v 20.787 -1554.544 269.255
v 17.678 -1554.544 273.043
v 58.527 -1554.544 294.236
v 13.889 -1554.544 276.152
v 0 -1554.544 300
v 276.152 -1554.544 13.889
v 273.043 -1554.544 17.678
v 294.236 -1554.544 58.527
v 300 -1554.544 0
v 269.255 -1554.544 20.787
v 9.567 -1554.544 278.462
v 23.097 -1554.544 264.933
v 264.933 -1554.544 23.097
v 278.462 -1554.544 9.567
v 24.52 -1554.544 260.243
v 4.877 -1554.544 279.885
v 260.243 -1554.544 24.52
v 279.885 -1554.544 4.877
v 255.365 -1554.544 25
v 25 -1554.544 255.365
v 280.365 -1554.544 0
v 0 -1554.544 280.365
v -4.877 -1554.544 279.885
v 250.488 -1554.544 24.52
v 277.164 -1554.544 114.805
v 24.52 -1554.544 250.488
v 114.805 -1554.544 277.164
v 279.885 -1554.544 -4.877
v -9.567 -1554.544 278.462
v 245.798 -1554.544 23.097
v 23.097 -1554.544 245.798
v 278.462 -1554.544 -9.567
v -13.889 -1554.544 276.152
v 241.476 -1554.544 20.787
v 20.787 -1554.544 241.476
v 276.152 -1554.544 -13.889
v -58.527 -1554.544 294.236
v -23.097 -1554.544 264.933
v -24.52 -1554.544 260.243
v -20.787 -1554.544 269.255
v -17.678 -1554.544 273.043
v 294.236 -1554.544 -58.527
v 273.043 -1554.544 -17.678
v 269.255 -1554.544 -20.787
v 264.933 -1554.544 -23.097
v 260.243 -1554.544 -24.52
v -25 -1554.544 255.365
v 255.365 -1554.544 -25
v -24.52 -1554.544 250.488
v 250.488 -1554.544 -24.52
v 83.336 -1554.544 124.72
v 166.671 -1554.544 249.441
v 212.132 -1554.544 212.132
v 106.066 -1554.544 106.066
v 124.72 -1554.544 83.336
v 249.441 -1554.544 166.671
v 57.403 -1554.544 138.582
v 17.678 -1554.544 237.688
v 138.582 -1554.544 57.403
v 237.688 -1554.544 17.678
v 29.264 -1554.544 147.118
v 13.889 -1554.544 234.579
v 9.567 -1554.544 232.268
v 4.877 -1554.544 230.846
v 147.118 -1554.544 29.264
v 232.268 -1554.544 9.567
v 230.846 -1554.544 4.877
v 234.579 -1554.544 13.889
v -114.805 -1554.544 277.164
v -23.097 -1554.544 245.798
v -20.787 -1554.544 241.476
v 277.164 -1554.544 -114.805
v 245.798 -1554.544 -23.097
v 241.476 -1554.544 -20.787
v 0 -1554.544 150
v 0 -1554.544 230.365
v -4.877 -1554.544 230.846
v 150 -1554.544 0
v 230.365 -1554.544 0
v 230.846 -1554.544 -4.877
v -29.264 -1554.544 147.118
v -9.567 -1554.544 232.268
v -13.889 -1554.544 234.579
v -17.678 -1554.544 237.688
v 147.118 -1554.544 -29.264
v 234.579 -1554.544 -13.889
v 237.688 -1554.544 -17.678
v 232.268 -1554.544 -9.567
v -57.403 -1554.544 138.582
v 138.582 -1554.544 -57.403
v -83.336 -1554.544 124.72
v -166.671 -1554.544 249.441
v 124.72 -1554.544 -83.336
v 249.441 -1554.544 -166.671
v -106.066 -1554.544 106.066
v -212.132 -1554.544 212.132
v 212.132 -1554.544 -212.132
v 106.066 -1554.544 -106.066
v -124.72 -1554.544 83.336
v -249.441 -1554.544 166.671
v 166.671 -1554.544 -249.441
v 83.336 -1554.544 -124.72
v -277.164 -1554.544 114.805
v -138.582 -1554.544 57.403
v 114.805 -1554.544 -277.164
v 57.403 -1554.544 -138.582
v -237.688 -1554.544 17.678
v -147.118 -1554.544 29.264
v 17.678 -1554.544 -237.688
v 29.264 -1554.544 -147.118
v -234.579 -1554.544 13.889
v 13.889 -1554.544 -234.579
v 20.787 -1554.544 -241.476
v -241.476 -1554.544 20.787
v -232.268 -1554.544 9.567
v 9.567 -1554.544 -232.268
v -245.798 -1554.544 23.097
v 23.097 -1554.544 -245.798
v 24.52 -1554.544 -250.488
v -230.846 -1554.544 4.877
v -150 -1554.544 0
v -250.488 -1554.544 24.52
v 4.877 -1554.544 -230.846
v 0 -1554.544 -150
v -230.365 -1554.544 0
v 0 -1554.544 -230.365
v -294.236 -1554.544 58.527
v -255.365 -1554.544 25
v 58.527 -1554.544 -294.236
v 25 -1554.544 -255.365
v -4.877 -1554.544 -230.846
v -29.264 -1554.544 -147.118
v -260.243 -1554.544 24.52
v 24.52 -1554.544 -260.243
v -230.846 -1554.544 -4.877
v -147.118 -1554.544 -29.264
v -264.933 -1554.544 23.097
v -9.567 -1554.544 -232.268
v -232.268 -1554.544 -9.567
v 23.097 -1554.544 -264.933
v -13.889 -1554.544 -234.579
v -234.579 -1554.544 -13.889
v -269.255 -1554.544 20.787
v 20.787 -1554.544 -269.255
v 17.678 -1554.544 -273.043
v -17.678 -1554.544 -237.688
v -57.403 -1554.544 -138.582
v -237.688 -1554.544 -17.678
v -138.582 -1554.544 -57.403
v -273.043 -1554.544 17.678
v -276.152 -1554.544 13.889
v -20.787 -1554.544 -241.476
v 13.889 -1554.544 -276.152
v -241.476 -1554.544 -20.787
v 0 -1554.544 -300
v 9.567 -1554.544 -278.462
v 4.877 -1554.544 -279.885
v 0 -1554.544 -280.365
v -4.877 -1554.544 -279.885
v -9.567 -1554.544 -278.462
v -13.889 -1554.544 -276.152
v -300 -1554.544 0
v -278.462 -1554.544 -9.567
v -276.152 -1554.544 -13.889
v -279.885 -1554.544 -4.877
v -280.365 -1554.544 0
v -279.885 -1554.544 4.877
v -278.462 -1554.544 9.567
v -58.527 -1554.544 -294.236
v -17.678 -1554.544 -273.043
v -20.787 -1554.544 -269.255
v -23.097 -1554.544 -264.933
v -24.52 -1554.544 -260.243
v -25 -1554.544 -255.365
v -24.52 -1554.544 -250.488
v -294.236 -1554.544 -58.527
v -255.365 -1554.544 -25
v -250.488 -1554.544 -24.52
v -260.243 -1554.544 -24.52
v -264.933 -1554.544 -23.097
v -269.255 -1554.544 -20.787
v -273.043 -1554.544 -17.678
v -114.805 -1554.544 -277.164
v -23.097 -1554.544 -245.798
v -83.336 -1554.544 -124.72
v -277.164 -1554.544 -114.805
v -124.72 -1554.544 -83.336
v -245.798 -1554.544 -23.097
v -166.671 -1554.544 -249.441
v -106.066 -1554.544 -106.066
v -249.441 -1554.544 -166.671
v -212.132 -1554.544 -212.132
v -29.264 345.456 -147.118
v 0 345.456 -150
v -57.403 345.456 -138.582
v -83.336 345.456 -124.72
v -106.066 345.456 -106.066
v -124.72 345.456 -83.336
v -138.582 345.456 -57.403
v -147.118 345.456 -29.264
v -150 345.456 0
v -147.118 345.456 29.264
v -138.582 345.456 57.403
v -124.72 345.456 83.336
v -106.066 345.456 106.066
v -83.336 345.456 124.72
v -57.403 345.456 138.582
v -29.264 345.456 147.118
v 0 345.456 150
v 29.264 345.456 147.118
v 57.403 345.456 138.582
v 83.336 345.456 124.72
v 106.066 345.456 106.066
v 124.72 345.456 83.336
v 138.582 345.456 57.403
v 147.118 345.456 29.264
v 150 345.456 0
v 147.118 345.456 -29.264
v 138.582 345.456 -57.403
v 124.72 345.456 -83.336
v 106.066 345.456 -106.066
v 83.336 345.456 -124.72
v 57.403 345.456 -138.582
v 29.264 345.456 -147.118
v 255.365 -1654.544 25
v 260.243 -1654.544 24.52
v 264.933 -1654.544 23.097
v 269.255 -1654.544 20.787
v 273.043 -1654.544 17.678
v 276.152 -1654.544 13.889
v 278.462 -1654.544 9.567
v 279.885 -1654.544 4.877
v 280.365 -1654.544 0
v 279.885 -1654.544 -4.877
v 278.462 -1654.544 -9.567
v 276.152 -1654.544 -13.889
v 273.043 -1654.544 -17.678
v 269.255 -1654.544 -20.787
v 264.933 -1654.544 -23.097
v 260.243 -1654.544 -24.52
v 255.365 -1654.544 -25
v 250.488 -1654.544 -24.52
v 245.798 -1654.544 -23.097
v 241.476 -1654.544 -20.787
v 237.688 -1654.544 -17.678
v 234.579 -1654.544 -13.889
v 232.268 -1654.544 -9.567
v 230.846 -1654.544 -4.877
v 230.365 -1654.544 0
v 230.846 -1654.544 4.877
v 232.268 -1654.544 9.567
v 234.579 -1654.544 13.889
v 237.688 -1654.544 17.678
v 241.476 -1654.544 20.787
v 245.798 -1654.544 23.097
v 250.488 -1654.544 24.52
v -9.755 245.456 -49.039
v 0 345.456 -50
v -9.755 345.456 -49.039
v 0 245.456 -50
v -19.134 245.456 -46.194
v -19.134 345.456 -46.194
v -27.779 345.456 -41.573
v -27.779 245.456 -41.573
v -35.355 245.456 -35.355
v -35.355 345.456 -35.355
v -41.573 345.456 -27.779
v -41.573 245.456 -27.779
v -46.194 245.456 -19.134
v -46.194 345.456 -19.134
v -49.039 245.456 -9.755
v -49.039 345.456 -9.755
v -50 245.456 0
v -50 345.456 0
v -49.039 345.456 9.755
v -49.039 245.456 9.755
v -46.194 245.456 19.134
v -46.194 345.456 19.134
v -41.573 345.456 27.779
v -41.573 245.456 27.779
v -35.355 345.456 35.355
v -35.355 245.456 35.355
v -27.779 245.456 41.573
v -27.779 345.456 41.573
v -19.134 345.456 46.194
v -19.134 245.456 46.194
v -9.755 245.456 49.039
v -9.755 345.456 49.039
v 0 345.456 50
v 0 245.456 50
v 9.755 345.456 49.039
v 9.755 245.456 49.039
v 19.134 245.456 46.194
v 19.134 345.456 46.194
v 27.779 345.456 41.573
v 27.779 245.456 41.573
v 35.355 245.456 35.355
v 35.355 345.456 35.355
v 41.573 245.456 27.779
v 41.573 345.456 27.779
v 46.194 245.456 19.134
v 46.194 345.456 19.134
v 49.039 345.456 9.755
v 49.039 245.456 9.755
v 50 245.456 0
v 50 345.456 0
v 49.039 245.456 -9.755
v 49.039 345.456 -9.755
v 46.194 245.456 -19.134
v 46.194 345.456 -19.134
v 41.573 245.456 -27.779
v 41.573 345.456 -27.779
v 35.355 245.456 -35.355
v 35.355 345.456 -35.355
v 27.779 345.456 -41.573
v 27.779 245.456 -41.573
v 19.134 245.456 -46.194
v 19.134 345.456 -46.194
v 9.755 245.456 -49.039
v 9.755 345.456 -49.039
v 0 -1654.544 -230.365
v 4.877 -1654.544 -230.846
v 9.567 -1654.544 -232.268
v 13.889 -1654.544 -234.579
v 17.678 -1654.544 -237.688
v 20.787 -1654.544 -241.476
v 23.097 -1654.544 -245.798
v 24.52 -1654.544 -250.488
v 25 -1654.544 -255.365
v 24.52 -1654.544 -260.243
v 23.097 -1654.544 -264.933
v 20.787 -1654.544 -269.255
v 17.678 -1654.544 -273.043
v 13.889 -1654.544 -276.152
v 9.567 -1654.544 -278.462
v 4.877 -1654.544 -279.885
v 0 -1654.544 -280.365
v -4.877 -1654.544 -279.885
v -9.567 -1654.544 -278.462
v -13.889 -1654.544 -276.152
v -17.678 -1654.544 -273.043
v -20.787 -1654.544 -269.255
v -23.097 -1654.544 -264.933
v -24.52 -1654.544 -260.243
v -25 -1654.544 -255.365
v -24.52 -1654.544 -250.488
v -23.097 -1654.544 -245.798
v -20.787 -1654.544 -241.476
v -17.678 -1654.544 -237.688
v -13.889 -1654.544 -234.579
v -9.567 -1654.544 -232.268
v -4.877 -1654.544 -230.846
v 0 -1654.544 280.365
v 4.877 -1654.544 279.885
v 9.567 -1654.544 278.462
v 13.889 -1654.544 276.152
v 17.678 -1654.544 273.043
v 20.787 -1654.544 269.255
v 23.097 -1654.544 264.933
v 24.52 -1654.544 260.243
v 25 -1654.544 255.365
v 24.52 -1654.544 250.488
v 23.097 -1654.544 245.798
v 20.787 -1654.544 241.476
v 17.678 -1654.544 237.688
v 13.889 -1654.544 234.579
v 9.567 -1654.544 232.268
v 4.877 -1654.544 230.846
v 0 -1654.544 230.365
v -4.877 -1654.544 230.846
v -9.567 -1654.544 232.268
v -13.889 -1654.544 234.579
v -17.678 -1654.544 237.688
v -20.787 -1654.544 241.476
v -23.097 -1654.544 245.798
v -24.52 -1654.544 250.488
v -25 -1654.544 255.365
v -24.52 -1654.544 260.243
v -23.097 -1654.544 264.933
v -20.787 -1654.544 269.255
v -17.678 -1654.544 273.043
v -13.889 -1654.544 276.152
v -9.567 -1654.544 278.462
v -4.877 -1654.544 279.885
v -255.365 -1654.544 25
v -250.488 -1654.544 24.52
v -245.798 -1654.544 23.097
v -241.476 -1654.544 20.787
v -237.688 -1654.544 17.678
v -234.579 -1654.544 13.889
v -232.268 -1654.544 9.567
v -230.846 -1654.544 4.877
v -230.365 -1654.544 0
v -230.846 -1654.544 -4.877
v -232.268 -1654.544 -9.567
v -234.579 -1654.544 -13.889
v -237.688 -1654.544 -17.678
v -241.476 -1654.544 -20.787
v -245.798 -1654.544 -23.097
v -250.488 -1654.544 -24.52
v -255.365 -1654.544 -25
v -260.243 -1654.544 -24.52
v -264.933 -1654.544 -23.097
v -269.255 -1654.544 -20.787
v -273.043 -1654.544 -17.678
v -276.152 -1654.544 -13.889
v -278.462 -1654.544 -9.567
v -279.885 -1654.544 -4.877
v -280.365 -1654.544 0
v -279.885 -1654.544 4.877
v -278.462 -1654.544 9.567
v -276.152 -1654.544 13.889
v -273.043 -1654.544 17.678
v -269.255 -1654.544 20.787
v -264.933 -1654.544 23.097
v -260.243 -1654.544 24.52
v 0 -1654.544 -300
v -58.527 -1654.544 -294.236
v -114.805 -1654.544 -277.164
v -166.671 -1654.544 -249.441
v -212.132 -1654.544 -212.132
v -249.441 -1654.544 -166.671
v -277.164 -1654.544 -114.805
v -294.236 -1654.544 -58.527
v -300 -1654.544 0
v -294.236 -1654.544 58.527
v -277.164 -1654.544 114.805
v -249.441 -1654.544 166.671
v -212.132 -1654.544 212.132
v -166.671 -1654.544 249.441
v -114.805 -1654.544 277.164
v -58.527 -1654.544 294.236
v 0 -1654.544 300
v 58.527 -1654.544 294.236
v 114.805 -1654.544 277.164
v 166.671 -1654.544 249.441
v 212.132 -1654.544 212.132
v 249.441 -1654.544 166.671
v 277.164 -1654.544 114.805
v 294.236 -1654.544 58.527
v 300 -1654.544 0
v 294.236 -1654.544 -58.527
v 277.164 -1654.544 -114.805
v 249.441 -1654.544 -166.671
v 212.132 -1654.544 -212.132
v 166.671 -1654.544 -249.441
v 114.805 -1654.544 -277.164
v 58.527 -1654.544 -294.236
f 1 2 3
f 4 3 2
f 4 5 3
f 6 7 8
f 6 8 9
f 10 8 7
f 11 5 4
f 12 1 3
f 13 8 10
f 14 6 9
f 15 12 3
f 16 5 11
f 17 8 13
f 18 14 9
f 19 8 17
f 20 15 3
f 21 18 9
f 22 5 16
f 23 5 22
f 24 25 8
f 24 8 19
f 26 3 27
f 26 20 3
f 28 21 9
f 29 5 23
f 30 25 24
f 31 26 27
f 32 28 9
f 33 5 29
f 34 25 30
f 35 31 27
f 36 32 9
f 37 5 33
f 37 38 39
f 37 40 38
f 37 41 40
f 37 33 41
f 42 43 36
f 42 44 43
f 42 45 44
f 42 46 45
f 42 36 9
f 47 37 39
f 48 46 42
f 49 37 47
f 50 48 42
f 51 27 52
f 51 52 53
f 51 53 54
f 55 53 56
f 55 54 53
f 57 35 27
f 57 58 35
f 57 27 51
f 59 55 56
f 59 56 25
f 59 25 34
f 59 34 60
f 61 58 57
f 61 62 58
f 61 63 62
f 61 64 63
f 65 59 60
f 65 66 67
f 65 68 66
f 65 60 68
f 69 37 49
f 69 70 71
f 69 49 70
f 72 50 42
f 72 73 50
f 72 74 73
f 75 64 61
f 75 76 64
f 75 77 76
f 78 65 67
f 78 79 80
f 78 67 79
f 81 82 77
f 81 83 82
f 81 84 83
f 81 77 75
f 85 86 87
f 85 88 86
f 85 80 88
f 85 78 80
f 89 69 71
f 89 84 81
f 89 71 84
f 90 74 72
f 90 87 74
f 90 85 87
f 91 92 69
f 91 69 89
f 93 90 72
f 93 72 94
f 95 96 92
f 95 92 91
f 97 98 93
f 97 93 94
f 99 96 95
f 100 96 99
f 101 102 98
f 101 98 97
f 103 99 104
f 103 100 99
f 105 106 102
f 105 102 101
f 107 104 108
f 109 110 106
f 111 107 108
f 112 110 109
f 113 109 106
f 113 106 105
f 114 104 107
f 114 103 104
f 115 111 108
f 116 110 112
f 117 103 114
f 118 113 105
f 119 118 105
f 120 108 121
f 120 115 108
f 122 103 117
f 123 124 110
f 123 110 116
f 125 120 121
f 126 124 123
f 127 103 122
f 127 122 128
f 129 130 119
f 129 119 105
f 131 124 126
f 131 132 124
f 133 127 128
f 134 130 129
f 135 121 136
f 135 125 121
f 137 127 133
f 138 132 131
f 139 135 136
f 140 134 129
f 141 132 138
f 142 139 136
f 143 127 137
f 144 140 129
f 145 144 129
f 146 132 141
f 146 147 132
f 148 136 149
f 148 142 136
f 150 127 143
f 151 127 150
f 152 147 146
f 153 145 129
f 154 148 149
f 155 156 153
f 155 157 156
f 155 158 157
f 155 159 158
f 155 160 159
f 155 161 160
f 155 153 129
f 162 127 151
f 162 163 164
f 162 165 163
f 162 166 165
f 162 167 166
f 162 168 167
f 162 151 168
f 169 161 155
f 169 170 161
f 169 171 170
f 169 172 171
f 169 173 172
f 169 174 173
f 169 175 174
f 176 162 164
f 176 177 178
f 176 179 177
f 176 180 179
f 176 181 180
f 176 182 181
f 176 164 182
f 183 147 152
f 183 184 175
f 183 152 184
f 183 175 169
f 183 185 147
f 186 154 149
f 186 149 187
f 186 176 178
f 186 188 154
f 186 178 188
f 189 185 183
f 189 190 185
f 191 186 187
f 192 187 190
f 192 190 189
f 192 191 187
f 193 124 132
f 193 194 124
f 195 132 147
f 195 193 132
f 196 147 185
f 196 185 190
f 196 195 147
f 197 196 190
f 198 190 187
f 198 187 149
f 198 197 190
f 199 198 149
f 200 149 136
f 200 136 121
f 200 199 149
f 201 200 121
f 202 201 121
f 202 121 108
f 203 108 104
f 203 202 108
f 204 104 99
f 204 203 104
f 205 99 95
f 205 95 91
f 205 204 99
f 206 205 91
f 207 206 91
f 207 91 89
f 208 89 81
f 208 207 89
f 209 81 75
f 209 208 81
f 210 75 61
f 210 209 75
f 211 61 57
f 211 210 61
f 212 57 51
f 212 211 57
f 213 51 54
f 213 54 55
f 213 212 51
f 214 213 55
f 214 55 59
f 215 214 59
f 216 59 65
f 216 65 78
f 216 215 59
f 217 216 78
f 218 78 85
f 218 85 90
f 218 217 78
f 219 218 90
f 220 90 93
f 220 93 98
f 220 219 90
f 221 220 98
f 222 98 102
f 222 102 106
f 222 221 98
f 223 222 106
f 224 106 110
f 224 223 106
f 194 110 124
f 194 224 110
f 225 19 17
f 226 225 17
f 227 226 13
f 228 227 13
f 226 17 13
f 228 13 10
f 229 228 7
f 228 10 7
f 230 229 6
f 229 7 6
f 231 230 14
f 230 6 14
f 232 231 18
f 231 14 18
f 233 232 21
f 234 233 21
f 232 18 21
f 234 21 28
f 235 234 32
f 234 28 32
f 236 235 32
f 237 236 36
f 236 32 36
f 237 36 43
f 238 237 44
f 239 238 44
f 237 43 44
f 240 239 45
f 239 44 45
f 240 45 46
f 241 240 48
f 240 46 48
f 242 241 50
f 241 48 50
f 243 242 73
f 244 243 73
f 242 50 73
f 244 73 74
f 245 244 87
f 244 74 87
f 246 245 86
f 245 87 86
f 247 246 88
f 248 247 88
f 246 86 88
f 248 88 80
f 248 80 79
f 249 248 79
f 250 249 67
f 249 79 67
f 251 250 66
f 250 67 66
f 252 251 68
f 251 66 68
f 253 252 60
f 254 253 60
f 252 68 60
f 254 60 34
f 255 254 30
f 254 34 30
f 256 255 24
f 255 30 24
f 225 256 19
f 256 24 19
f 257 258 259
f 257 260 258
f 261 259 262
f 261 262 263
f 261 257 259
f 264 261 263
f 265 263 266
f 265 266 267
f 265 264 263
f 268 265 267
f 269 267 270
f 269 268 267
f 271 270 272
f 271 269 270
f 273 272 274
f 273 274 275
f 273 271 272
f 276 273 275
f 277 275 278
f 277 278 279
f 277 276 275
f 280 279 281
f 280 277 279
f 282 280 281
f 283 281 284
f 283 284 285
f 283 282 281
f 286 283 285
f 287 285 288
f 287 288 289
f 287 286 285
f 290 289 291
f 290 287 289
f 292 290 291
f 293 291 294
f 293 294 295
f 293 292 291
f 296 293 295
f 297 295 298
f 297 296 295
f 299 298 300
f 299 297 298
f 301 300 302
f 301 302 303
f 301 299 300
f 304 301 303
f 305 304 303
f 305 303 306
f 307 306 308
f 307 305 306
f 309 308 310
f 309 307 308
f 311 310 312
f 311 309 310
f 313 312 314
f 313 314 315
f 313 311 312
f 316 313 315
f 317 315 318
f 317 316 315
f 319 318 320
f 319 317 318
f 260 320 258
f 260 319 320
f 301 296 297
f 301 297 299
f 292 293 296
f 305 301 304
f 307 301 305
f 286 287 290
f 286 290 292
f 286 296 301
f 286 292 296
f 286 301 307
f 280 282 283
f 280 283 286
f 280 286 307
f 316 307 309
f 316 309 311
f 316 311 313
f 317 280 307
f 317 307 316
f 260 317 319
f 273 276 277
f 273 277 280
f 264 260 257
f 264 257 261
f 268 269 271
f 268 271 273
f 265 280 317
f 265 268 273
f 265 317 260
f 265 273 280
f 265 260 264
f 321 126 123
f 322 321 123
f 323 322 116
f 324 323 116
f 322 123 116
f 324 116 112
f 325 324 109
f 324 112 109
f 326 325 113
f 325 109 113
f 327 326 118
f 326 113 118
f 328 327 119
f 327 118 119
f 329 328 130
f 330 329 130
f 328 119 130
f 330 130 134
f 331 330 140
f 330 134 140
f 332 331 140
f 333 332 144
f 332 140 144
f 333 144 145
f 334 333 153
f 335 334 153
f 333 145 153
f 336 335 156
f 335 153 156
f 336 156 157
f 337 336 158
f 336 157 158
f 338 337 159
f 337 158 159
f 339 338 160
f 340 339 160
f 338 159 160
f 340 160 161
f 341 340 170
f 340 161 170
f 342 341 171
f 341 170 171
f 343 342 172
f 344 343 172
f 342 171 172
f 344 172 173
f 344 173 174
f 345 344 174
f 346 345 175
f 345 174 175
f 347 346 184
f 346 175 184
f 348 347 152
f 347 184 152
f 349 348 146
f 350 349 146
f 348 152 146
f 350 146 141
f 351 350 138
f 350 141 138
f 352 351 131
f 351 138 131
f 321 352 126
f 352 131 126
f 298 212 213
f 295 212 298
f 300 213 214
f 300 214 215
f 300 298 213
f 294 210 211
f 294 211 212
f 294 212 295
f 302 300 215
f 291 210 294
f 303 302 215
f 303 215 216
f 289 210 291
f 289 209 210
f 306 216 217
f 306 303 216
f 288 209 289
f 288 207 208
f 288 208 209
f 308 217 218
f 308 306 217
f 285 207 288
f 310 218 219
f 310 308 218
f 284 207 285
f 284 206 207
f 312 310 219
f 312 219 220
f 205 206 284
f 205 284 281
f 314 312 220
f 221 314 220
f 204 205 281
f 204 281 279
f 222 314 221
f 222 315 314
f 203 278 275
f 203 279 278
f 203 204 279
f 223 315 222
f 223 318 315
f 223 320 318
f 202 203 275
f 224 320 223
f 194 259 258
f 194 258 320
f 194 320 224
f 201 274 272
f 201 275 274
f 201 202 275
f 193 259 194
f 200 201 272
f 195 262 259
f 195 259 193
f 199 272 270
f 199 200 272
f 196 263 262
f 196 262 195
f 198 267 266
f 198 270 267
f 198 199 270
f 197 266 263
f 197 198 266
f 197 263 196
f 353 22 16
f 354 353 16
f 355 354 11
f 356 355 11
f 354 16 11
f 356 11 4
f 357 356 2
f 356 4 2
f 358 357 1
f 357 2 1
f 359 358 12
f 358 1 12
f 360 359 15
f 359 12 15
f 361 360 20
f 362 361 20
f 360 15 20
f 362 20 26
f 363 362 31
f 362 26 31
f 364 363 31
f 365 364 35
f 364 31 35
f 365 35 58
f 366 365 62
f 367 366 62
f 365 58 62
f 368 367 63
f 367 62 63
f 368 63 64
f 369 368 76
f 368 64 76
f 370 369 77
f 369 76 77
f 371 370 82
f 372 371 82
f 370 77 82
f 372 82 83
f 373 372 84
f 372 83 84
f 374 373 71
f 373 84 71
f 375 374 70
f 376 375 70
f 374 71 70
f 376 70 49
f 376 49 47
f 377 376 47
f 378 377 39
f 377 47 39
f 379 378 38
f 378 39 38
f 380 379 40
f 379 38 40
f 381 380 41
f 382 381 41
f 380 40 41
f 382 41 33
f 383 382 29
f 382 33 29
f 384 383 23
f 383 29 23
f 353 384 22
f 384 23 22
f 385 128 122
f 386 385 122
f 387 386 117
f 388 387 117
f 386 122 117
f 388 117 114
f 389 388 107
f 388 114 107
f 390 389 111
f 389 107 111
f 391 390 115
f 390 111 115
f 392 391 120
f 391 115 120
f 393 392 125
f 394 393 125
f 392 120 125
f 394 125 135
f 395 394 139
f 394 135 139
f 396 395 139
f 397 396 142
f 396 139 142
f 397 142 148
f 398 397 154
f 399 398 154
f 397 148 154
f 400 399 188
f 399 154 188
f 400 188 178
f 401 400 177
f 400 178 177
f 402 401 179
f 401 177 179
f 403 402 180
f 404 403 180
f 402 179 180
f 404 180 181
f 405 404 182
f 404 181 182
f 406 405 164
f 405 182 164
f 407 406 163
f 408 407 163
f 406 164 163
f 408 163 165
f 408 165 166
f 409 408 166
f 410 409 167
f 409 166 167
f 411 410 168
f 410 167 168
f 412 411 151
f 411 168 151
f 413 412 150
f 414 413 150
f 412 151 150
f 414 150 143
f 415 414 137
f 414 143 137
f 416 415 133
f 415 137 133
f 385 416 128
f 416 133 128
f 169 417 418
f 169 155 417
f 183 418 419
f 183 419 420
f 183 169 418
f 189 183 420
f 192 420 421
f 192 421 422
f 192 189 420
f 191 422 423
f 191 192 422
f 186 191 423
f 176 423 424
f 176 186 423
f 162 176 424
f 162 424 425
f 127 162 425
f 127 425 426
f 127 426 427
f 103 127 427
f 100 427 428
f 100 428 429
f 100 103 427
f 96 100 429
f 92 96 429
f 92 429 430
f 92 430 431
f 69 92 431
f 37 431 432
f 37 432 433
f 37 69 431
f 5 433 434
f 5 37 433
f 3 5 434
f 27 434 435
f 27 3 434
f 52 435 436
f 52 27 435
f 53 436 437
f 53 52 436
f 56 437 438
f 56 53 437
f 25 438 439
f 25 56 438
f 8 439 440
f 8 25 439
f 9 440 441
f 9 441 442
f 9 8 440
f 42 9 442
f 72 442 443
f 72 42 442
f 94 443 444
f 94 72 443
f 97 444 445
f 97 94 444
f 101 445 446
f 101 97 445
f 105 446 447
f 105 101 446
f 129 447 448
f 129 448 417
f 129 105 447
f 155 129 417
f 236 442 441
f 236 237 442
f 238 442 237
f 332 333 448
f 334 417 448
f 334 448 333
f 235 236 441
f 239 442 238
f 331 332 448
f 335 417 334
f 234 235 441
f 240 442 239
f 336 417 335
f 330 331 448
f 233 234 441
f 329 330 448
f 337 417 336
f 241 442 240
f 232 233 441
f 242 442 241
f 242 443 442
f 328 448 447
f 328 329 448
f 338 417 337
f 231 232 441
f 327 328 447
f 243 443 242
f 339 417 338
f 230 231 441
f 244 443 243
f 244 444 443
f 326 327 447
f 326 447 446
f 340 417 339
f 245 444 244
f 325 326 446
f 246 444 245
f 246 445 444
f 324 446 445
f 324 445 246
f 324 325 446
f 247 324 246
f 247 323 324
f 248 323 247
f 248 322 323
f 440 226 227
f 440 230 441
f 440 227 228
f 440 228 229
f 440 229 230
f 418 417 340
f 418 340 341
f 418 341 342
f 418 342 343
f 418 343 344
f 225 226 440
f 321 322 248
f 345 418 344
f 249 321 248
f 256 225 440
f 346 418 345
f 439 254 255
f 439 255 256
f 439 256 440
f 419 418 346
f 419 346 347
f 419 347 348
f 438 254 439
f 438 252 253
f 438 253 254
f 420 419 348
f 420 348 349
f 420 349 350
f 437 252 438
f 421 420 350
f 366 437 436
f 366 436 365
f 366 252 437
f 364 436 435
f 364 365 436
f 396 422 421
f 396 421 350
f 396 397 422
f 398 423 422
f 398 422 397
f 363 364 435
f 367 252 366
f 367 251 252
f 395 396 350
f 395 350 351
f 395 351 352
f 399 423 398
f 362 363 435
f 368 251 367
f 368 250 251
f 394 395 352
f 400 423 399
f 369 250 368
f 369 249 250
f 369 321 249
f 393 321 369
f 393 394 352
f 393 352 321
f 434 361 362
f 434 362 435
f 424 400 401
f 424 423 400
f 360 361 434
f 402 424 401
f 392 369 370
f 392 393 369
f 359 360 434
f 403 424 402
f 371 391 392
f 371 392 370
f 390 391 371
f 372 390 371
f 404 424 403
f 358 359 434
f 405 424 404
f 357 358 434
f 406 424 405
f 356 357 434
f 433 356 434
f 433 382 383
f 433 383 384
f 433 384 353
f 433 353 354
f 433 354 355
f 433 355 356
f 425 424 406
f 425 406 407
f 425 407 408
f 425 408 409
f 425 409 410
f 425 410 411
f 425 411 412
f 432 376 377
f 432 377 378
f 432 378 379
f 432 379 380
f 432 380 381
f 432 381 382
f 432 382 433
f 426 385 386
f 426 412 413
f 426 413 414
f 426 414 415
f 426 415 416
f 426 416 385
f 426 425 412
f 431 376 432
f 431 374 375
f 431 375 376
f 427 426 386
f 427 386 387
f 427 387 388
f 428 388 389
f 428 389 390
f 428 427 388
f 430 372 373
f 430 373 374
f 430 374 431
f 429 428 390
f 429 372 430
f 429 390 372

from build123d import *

# Parameters (mm, degrees)
SKETCH5_R          = 25
CUT_EXTRUDE2_DEPTH = 100


with BuildPart() as part:
    # Sketch4 → Revolve2 (revolve)
    with BuildSketch(Plane.XY):
        Polygon((0, -1654.544205968), (300, -1654.544205968), (300, -1554.544205968), (150, -1554.544205968), (150, 345.455794032), (50, 345.455794032), (50, 245.455794032), (0, 245.455794032), align=None)
    revolve(axis=Axis((0, -1654.544205968, 0), (0, 1, 0)))

    # Sketch5 → Cut-Extrude2 (cut)
    with BuildSketch(Plane(origin=(0, -1554.544205968, 0), x_dir=(1, 0, 0), z_dir=(0, 1, 0))):
        with Locations((0, 255.365455535)):
            Circle(SKETCH5_R)
        with Locations((255.365455535, 0)):
            Circle(SKETCH5_R)
        with Locations((0, -255.365455535)):
            Circle(SKETCH5_R)
        with Locations((-255.365455535, 0)):
            Circle(SKETCH5_R)
    extrude(amount=-CUT_EXTRUDE2_DEPTH, mode=Mode.SUBTRACT)


solid = part.part
